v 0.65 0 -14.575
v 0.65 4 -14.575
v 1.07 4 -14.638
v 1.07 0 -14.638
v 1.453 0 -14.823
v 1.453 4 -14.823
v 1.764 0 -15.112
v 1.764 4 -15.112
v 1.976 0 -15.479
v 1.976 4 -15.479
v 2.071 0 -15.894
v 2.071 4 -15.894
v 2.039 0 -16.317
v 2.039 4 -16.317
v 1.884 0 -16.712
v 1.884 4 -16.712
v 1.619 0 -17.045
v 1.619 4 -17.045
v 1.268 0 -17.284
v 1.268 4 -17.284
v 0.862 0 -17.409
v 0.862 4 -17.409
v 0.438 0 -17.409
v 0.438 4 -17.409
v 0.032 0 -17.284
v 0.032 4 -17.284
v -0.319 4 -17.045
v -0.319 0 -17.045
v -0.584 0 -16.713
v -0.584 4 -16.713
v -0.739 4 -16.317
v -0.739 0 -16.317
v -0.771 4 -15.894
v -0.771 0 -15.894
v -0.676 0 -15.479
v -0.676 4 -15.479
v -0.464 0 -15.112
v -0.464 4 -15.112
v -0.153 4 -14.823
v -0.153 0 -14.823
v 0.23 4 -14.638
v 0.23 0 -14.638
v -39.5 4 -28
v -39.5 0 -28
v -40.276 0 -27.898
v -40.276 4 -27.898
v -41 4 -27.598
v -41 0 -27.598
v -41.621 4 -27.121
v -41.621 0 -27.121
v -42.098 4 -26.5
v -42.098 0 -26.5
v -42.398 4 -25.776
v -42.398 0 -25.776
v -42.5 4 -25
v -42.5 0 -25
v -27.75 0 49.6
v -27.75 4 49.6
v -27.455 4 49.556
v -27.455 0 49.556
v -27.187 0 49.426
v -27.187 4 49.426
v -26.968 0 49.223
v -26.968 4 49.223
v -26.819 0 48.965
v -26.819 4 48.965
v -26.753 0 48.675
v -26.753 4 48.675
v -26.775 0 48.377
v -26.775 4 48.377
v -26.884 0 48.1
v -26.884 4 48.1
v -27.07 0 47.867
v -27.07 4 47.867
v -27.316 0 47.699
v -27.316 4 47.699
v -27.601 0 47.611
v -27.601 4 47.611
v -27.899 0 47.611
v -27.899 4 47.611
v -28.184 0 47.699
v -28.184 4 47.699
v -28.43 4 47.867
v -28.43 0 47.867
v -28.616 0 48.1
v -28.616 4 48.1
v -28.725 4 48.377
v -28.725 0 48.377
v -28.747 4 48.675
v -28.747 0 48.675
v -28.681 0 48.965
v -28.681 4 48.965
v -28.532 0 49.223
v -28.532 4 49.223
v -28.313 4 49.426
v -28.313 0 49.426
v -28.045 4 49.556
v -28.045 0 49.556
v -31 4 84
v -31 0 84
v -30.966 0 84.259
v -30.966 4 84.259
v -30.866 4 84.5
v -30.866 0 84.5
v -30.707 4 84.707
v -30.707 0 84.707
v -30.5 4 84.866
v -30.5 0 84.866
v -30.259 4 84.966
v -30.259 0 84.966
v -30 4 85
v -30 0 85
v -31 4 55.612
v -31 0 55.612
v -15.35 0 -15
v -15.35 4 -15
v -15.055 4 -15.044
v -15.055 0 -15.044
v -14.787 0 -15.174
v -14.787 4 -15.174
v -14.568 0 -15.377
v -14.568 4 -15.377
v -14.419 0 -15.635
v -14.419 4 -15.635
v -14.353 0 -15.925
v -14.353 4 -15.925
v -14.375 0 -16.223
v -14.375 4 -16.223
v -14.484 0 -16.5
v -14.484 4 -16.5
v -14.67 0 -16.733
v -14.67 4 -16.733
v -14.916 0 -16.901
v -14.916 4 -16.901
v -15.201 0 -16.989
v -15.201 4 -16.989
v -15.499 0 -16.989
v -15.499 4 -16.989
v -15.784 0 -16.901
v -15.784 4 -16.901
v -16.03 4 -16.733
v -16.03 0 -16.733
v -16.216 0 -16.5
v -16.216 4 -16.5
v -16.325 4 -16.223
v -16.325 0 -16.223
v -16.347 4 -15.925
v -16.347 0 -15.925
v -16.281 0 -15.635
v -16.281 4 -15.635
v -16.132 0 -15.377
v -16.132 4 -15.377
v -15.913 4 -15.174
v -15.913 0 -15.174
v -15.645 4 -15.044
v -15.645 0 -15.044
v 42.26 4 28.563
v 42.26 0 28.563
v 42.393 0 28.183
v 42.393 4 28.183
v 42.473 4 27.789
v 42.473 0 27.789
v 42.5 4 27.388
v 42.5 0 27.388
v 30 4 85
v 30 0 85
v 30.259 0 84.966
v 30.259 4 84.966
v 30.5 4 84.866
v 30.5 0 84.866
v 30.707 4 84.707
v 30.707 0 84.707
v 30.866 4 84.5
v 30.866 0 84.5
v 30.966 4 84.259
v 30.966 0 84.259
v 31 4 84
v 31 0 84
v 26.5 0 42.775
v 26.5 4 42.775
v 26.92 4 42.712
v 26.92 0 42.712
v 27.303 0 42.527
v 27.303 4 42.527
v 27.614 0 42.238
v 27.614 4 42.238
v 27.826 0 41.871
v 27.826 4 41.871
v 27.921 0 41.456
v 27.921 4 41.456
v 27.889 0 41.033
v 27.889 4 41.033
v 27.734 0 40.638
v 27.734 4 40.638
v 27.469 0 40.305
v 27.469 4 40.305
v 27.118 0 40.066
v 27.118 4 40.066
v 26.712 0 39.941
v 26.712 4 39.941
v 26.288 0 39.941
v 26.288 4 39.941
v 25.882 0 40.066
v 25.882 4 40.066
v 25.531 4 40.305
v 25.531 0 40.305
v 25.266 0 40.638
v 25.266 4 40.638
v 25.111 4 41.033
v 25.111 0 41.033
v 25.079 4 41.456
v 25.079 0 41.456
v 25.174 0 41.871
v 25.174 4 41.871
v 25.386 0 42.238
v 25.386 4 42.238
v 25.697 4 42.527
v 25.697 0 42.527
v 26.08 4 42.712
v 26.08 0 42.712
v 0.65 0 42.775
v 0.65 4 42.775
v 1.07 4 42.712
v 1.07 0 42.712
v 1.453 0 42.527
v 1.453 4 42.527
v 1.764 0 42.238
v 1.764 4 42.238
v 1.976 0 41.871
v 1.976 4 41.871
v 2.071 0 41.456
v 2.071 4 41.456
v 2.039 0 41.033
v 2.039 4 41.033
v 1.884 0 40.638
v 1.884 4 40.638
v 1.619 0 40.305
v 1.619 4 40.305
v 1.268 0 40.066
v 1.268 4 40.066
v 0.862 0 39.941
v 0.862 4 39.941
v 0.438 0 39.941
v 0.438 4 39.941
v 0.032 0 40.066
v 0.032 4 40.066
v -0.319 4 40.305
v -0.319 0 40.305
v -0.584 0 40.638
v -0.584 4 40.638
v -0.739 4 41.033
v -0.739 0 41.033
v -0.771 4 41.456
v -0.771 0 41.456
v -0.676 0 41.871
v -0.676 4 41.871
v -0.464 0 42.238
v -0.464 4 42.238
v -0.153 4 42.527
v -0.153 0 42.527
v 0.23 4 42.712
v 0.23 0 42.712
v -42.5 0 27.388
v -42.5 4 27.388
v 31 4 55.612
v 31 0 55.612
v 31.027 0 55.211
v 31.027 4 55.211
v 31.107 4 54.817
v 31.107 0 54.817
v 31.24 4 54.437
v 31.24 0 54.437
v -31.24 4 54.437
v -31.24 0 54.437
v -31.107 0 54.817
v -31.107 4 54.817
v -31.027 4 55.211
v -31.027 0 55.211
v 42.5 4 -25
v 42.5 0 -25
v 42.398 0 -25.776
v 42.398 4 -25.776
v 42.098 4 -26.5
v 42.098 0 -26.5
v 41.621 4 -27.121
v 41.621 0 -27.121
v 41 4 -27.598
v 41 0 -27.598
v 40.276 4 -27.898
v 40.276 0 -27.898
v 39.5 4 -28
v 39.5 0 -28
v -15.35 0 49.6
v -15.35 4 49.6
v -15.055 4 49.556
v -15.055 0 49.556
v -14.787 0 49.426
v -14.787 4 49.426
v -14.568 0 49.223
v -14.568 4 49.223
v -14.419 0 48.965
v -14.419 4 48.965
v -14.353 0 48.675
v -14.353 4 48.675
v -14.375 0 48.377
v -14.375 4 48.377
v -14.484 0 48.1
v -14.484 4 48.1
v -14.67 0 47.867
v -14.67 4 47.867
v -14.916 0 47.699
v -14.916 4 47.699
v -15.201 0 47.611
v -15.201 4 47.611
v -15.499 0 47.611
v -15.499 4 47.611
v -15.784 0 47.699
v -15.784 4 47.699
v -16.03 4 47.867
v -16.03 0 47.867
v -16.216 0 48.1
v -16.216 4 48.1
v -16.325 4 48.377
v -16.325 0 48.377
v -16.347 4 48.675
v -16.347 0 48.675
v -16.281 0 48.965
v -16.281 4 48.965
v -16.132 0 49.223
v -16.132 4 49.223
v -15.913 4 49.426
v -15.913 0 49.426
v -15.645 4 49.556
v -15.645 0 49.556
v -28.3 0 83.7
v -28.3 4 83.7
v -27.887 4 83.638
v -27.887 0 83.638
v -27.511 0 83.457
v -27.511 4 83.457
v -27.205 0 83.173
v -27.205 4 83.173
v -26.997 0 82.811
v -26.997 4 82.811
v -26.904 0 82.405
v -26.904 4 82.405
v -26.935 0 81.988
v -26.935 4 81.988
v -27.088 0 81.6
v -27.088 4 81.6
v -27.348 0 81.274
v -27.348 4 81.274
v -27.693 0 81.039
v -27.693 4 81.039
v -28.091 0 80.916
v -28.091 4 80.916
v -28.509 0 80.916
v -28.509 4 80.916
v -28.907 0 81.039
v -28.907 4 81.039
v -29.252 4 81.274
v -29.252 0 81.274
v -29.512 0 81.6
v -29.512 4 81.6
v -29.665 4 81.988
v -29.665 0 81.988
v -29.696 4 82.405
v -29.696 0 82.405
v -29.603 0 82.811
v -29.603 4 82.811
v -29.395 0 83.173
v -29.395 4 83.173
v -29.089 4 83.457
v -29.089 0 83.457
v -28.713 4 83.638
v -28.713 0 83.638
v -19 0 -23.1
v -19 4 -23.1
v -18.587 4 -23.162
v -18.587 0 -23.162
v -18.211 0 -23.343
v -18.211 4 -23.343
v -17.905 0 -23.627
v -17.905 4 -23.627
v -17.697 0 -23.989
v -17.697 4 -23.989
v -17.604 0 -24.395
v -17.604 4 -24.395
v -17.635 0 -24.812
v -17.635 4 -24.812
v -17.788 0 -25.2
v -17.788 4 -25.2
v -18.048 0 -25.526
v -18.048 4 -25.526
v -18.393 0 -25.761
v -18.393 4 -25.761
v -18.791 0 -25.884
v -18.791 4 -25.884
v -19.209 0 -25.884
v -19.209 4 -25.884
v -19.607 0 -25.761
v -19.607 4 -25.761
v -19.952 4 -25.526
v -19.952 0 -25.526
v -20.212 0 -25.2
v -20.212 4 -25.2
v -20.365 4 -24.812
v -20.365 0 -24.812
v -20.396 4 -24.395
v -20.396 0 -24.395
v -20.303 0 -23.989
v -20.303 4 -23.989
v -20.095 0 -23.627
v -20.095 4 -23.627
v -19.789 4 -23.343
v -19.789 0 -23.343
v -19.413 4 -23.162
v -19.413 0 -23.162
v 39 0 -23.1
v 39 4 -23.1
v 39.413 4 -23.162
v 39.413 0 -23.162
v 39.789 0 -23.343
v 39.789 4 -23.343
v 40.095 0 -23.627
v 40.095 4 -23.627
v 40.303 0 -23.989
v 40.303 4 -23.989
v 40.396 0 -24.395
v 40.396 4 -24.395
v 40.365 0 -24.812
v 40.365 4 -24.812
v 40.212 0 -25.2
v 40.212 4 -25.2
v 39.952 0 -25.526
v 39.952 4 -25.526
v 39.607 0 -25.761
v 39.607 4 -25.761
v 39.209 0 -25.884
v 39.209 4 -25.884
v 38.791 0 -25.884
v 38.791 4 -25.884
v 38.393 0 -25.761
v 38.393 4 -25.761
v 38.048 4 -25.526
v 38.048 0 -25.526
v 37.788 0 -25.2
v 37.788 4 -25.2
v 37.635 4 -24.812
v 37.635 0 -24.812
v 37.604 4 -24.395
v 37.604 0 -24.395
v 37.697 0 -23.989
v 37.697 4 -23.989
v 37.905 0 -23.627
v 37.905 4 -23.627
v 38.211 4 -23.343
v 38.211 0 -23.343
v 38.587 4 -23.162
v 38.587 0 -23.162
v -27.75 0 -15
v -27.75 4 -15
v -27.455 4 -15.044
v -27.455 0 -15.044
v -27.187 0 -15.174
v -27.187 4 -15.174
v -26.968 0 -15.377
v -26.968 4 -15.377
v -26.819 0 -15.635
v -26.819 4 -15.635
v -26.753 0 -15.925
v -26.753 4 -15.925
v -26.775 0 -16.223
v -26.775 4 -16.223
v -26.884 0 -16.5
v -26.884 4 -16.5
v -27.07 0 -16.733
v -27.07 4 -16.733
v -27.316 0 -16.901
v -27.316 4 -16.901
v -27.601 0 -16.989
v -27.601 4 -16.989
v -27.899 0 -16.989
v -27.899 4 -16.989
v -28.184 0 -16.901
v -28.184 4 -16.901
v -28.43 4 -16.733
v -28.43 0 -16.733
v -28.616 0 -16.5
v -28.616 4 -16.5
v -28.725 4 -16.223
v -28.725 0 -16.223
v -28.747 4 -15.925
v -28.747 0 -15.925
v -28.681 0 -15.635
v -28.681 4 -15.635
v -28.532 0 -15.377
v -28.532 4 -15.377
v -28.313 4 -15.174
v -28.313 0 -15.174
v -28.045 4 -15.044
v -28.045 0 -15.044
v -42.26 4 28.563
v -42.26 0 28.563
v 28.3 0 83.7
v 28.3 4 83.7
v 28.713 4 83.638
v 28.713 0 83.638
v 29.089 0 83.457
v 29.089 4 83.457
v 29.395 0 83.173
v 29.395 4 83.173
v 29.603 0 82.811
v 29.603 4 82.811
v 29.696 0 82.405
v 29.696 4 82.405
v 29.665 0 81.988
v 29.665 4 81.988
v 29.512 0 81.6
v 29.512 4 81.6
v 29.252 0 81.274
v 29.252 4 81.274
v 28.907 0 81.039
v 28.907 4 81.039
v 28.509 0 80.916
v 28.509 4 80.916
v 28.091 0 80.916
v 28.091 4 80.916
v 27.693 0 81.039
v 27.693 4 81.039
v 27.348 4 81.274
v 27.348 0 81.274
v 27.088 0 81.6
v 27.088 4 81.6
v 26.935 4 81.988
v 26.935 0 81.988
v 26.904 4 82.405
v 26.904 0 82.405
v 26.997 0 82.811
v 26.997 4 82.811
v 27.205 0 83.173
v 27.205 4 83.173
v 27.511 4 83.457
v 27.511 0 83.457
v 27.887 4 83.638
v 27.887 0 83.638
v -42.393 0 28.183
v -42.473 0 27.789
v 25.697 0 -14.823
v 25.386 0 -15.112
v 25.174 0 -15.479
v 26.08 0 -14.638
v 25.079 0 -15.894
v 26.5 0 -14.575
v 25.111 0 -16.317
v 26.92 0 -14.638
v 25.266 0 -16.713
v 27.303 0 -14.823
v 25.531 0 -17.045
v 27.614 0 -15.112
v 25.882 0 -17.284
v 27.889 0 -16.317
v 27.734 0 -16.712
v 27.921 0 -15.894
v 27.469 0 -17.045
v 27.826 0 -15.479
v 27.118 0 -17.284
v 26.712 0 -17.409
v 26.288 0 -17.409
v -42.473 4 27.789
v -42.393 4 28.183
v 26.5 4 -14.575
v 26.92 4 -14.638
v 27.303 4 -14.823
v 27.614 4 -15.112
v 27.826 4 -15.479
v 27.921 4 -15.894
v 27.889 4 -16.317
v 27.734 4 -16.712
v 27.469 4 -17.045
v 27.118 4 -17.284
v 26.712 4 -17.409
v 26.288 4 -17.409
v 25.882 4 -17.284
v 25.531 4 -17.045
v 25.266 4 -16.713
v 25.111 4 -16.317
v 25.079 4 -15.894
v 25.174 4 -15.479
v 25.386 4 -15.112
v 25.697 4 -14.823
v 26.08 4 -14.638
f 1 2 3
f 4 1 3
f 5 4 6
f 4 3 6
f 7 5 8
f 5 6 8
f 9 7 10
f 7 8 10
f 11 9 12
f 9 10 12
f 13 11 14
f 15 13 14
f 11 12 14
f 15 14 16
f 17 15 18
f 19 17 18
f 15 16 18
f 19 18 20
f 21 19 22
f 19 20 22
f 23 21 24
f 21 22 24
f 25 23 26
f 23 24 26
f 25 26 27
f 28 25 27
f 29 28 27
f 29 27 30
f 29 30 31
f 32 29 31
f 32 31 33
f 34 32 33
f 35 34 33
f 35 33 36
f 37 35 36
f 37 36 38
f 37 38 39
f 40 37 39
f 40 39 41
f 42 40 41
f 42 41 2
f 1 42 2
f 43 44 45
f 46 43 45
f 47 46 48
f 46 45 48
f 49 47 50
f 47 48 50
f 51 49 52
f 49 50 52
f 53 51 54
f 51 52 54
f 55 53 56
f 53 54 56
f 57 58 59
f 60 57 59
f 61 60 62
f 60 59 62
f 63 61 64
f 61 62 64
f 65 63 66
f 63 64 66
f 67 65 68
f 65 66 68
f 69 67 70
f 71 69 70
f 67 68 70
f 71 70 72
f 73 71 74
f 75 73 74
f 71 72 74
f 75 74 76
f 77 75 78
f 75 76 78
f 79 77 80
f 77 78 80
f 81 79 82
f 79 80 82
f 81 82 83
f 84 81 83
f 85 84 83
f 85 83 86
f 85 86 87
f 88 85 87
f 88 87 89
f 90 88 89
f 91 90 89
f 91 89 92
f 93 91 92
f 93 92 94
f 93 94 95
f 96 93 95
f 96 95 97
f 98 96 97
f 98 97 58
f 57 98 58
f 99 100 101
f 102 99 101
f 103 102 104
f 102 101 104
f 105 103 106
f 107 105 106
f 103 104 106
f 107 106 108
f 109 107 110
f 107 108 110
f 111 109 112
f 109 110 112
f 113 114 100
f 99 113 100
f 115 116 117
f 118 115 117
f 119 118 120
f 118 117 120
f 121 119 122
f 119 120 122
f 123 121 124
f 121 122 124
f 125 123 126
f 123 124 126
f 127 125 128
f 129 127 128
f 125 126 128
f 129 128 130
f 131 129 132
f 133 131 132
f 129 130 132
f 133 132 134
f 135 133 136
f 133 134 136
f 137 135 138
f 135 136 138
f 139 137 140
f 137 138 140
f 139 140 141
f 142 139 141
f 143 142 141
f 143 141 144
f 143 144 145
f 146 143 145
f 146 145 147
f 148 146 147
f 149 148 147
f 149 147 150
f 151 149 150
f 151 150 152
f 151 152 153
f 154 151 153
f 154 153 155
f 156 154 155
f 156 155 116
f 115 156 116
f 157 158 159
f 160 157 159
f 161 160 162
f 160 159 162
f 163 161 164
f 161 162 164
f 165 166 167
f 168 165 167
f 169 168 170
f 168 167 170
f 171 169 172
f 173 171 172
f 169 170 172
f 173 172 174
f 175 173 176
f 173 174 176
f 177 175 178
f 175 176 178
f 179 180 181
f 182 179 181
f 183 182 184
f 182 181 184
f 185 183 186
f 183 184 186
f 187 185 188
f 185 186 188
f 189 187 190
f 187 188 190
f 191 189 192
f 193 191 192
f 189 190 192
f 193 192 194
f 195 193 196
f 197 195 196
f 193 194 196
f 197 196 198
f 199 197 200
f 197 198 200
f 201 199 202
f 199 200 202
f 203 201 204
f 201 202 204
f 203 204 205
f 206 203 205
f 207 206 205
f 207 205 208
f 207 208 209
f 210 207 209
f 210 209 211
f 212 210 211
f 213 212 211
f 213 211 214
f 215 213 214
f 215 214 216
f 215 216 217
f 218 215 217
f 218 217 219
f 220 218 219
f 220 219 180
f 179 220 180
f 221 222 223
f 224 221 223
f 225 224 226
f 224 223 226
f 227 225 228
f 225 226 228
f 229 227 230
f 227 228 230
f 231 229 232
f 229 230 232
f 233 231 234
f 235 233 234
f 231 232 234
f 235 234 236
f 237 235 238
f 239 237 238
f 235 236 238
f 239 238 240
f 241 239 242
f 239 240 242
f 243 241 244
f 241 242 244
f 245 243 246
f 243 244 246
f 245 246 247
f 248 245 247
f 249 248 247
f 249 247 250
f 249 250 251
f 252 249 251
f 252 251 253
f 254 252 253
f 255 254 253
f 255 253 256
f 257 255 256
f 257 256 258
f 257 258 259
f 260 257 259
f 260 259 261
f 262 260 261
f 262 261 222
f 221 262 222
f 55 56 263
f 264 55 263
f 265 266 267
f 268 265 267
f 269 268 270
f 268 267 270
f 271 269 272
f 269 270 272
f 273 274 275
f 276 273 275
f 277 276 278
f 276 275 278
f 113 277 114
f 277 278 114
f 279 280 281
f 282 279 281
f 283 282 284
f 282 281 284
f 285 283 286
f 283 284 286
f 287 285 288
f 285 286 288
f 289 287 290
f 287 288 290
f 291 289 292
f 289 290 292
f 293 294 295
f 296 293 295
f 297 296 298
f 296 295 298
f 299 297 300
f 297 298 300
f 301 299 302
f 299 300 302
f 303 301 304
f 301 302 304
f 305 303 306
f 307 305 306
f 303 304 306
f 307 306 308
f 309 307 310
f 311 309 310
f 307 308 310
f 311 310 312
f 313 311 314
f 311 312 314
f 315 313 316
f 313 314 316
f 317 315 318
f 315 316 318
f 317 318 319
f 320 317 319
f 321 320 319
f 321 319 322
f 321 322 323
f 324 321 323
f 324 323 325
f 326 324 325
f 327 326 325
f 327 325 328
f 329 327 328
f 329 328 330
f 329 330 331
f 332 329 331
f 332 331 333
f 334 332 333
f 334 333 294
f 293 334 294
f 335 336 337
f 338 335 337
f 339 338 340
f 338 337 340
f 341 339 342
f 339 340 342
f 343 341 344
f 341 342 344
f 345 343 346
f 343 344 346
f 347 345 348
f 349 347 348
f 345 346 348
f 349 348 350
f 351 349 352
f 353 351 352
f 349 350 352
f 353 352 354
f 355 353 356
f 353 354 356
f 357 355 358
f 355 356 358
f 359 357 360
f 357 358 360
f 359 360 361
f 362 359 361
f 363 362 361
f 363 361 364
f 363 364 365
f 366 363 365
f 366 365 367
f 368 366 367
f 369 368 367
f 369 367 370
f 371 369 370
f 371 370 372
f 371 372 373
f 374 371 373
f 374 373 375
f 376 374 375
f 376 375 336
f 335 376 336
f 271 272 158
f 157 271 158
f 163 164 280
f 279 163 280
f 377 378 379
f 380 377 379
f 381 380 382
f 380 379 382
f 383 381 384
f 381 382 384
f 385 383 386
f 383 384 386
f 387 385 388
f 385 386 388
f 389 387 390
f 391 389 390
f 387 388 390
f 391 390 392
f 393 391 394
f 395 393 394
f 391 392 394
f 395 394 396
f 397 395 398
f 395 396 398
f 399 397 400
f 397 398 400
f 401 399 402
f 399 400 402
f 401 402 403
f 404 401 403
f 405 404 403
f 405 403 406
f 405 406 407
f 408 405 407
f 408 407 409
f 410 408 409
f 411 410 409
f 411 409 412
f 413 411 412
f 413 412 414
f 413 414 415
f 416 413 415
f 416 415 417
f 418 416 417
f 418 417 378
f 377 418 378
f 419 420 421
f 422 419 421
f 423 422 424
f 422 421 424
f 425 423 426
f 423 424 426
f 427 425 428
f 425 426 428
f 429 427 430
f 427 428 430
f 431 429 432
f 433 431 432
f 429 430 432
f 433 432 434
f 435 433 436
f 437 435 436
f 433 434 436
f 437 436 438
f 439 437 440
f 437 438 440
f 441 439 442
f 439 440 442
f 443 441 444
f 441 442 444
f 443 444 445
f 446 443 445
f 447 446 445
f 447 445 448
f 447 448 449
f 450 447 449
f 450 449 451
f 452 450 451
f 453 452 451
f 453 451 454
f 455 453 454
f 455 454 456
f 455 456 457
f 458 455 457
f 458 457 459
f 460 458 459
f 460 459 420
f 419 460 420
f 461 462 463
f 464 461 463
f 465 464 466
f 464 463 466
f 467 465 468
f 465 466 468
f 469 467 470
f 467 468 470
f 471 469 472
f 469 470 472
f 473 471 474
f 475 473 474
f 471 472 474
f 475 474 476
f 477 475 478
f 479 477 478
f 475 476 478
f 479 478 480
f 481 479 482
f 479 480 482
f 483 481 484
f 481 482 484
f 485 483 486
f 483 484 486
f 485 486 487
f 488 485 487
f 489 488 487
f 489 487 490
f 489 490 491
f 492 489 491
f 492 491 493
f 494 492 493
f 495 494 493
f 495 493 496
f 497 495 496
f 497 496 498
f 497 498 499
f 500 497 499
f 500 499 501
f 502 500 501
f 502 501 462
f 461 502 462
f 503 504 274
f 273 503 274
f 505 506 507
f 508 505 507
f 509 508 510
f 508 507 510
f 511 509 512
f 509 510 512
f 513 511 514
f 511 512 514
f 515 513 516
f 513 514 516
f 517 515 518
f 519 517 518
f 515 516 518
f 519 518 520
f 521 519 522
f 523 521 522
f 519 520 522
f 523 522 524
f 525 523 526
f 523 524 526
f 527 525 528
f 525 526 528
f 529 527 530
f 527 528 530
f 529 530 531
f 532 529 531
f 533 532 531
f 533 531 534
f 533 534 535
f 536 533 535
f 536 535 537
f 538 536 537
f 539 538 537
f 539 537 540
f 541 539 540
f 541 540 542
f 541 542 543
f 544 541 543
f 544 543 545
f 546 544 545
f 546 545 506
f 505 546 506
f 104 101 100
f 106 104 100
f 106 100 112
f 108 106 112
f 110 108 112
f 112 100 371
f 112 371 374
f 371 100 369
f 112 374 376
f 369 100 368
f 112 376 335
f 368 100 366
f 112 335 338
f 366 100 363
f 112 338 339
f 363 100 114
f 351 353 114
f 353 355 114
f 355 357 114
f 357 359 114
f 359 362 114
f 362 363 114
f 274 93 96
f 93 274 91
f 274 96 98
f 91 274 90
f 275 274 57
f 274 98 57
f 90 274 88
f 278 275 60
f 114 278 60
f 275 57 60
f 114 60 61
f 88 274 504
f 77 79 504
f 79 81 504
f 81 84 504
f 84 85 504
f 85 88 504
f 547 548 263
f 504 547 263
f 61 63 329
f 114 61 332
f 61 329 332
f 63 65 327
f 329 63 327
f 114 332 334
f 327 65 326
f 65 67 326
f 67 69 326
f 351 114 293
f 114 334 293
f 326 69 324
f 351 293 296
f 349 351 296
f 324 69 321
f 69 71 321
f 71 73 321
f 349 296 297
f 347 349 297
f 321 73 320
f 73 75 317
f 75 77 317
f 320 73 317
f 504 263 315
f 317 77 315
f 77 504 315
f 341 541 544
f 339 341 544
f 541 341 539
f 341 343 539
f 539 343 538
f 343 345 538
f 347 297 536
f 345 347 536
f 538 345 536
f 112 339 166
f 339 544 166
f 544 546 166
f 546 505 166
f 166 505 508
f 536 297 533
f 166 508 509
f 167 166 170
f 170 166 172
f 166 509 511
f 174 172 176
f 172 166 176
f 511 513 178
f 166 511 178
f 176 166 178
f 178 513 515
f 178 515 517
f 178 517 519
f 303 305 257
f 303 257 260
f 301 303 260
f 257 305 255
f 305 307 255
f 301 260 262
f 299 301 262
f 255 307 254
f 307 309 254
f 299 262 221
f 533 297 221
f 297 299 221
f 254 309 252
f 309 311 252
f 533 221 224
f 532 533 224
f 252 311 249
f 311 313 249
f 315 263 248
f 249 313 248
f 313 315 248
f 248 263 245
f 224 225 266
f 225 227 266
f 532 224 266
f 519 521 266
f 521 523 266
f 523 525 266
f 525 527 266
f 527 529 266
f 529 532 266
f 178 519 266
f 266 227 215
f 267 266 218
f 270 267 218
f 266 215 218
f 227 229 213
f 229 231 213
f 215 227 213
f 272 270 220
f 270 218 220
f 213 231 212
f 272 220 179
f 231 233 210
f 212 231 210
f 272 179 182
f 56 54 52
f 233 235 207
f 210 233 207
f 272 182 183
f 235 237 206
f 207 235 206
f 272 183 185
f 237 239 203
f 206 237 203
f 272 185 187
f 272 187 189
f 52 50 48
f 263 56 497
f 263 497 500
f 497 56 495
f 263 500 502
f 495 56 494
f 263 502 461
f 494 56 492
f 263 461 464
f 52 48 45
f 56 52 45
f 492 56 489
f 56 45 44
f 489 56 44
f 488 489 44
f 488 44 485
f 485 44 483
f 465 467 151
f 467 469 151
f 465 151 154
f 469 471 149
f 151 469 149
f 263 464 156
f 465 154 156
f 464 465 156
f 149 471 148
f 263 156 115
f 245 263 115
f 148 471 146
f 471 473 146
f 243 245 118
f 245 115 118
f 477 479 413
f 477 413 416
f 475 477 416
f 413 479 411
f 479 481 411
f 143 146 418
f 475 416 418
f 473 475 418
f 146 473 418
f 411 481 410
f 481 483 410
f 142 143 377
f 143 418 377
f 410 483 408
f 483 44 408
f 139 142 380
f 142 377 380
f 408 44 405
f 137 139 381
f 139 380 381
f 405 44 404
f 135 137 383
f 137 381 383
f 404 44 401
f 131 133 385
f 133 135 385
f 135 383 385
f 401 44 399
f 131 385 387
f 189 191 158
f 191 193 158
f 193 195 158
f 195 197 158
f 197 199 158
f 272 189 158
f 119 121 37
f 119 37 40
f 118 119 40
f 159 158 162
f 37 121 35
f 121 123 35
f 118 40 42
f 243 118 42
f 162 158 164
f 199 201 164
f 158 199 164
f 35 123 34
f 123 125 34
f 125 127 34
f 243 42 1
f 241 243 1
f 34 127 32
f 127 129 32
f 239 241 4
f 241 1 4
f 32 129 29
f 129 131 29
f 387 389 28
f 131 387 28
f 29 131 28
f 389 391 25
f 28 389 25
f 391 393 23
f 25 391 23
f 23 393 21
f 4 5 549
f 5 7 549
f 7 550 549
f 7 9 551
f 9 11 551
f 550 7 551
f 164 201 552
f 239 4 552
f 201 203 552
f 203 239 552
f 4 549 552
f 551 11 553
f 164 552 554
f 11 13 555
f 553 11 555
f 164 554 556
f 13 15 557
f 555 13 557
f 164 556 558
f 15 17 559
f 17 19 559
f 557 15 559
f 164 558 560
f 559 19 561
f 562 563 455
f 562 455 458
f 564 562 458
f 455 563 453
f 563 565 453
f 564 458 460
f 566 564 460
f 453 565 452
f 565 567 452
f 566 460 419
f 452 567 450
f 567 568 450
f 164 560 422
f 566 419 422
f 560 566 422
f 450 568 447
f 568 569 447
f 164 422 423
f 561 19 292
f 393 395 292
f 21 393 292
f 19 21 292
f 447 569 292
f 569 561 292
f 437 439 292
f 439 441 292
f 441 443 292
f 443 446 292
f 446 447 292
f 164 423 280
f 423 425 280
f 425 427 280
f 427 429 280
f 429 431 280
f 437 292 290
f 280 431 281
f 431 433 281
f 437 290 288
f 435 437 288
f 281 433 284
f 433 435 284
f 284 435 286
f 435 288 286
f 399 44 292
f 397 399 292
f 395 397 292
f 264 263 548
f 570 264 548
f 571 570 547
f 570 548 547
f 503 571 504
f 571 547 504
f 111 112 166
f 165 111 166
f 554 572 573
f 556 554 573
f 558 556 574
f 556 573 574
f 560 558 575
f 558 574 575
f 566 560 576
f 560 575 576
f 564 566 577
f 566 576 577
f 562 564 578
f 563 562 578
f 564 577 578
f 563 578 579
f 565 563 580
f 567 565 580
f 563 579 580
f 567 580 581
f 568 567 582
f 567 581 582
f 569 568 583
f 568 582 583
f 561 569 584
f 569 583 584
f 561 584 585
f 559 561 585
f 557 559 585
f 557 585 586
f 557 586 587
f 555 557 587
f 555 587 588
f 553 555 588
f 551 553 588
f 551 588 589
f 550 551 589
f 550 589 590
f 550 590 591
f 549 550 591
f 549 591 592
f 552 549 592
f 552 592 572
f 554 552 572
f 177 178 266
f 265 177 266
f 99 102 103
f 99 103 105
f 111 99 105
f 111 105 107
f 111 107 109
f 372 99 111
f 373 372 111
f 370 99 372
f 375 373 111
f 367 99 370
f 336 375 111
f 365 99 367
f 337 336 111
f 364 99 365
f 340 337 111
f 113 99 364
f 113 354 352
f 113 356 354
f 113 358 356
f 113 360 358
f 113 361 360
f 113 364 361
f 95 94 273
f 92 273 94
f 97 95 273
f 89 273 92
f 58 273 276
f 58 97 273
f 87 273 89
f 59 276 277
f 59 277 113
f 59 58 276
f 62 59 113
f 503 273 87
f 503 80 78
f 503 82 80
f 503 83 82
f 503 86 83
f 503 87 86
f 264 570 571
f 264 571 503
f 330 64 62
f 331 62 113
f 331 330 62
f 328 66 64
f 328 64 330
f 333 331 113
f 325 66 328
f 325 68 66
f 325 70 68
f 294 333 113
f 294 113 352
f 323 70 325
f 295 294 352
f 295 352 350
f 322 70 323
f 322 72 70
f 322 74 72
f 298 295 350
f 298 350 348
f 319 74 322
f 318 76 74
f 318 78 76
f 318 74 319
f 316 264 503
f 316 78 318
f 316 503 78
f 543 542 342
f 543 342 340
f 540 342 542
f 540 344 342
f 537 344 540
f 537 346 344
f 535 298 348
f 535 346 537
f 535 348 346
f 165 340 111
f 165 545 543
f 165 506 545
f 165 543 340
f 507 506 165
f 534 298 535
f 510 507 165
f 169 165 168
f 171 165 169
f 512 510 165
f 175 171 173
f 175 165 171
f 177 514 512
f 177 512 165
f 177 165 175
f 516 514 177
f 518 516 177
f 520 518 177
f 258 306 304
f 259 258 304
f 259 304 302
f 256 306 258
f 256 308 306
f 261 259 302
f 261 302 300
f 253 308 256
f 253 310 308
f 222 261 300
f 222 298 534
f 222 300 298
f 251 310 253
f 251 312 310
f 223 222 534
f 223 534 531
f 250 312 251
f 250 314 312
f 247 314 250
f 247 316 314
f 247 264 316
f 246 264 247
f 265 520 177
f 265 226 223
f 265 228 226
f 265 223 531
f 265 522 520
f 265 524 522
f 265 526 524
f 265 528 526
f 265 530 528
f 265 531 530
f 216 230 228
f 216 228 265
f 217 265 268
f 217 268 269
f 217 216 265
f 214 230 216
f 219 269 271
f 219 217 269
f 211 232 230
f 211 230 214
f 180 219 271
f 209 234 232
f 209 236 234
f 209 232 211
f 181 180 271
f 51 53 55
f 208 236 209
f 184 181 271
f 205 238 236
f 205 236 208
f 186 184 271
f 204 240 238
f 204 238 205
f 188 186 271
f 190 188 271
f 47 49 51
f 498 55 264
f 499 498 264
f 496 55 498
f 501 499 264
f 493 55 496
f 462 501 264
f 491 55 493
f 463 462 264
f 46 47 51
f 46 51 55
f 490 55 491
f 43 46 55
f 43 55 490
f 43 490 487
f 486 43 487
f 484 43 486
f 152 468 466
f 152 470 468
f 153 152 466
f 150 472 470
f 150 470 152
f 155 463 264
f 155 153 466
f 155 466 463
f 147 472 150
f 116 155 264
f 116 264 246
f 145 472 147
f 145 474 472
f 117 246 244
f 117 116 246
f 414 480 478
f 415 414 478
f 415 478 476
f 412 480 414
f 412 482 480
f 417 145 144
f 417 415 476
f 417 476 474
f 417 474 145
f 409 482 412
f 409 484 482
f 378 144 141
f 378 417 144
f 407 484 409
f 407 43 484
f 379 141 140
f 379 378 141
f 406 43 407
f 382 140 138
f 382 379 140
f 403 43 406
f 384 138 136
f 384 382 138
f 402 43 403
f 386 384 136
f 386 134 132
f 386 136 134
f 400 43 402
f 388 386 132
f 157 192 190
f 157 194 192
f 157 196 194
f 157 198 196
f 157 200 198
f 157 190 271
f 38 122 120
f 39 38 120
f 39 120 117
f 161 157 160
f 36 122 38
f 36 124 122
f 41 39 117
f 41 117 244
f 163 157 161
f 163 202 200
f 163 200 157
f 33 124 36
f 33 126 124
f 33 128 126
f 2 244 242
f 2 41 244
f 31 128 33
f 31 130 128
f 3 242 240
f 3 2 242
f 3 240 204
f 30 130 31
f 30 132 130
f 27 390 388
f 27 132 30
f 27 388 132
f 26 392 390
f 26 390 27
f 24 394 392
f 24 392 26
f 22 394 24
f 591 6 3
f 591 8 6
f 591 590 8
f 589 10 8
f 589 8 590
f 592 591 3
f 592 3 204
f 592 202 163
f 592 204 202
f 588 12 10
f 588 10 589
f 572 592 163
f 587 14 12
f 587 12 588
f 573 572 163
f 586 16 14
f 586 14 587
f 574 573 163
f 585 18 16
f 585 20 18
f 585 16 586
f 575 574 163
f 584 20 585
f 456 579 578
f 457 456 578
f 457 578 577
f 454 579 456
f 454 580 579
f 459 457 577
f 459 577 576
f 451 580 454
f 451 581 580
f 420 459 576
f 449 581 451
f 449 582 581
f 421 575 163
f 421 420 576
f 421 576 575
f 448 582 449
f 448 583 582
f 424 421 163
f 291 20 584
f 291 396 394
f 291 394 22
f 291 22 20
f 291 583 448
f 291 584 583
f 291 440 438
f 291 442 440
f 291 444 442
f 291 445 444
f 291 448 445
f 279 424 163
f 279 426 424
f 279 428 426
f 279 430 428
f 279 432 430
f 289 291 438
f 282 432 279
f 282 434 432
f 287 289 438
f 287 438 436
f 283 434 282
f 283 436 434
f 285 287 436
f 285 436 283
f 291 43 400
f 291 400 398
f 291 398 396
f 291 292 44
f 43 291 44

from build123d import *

# Parameters (mm, degrees)
BOSS_EXTRUDE1_DEPTH = 4
SKETCH2_R           = 1.4
SKETCH2_R_2         = 1.425
SKETCH2_R_3         = 1
CUT_EXTRUDE1_DEPTH  = 96.117033175


with BuildPart() as part:
    # Sketch1 → Boss-Extrude1 (new body)
    with BuildSketch(Plane(origin=(0, 0, 0), x_dir=(1, 0, 0), z_dir=(0, 1, 0))):
        with BuildLine():
            Line((-42.260071937, -28.563309365), (-31.239928063, -54.436690635))
            ThreePointArc((-31.239928063, -54.436690635), (-31.060593954, -55.012366758), (-31, -55.61227683))
            Line((-31, -55.61227683), (-31, -84))
            ThreePointArc((-31, -84), (-30.707106781, -84.707106781), (-30, -85))
            Line((-30, -85), (30, -85))
            ThreePointArc((30, -85), (30.707106781, -84.707106781), (31, -84))
            Line((31, -84), (31, -55.61227683))
            ThreePointArc((31, -55.61227683), (31.060593954, -55.012366758), (31.239928063, -54.436690635))
            Line((31.239928063, -54.436690635), (42.260071937, -28.563309365))
            ThreePointArc((42.260071937, -28.563309365), (42.439406046, -27.987633242), (42.5, -27.38772317))
            Line((42.5, -27.38772317), (42.5, 25))
            ThreePointArc((42.5, 25), (41.621320344, 27.121320344), (39.5, 28))
            Line((39.5, 28), (-39.5, 28))
            ThreePointArc((-39.5, 28), (-41.621320344, 27.121320344), (-42.5, 25))
            Line((-42.5, 25), (-42.5, -27.38772317))
            ThreePointArc((-42.5, -27.38772317), (-42.439406046, -27.987633242), (-42.260071937, -28.563309365))
        make_face()
    extrude(amount=BOSS_EXTRUDE1_DEPTH)

    # Sketch2 → Cut-Extrude1 (cut, through all)
    with BuildSketch(Plane(origin=(0, 4, 0), x_dir=(1, 0, 0), z_dir=(0, 1, 0))):
        with Locations(Location((39, 24.5, 0), (0, 0, 270))):
            Circle(SKETCH2_R)
        with Locations(Location((-19, 24.5, 0), (0, 0, 270))):
            Circle(SKETCH2_R)
        with Locations(Location((-28.3, -82.3, 0), (0, 0, 270))):
            Circle(SKETCH2_R)
        with Locations(Location((28.3, -82.3, 0), (0, 0, 270))):
            Circle(SKETCH2_R)
        with Locations(Location((26.5, 16, 0), (0, 0, 270))):
            Circle(SKETCH2_R_2)
        with Locations(Location((0.65, 16, 0), (0, 0, 270))):
            Circle(SKETCH2_R_2)
        with Locations(Location((26.5, -41.35, 0), (0, 0, 270))):
            Circle(SKETCH2_R_2)
        with Locations(Location((0.65, -41.35, 0), (0, 0, 270))):
            Circle(SKETCH2_R_2)
        with Locations(Location((-15.35, 16, 0), (0, 0, 270))):
            Circle(SKETCH2_R_3)
        with Locations(Location((-27.75, 16, 0), (0, 0, 270))):
            Circle(SKETCH2_R_3)
        with Locations(Location((-15.35, -48.6, 0), (0, 0, 270))):
            Circle(SKETCH2_R_3)
        with Locations(Location((-27.75, -48.6, 0), (0, 0, 270))):
            Circle(SKETCH2_R_3)
    extrude(amount=-CUT_EXTRUDE1_DEPTH, mode=Mode.SUBTRACT)


solid = part.part
